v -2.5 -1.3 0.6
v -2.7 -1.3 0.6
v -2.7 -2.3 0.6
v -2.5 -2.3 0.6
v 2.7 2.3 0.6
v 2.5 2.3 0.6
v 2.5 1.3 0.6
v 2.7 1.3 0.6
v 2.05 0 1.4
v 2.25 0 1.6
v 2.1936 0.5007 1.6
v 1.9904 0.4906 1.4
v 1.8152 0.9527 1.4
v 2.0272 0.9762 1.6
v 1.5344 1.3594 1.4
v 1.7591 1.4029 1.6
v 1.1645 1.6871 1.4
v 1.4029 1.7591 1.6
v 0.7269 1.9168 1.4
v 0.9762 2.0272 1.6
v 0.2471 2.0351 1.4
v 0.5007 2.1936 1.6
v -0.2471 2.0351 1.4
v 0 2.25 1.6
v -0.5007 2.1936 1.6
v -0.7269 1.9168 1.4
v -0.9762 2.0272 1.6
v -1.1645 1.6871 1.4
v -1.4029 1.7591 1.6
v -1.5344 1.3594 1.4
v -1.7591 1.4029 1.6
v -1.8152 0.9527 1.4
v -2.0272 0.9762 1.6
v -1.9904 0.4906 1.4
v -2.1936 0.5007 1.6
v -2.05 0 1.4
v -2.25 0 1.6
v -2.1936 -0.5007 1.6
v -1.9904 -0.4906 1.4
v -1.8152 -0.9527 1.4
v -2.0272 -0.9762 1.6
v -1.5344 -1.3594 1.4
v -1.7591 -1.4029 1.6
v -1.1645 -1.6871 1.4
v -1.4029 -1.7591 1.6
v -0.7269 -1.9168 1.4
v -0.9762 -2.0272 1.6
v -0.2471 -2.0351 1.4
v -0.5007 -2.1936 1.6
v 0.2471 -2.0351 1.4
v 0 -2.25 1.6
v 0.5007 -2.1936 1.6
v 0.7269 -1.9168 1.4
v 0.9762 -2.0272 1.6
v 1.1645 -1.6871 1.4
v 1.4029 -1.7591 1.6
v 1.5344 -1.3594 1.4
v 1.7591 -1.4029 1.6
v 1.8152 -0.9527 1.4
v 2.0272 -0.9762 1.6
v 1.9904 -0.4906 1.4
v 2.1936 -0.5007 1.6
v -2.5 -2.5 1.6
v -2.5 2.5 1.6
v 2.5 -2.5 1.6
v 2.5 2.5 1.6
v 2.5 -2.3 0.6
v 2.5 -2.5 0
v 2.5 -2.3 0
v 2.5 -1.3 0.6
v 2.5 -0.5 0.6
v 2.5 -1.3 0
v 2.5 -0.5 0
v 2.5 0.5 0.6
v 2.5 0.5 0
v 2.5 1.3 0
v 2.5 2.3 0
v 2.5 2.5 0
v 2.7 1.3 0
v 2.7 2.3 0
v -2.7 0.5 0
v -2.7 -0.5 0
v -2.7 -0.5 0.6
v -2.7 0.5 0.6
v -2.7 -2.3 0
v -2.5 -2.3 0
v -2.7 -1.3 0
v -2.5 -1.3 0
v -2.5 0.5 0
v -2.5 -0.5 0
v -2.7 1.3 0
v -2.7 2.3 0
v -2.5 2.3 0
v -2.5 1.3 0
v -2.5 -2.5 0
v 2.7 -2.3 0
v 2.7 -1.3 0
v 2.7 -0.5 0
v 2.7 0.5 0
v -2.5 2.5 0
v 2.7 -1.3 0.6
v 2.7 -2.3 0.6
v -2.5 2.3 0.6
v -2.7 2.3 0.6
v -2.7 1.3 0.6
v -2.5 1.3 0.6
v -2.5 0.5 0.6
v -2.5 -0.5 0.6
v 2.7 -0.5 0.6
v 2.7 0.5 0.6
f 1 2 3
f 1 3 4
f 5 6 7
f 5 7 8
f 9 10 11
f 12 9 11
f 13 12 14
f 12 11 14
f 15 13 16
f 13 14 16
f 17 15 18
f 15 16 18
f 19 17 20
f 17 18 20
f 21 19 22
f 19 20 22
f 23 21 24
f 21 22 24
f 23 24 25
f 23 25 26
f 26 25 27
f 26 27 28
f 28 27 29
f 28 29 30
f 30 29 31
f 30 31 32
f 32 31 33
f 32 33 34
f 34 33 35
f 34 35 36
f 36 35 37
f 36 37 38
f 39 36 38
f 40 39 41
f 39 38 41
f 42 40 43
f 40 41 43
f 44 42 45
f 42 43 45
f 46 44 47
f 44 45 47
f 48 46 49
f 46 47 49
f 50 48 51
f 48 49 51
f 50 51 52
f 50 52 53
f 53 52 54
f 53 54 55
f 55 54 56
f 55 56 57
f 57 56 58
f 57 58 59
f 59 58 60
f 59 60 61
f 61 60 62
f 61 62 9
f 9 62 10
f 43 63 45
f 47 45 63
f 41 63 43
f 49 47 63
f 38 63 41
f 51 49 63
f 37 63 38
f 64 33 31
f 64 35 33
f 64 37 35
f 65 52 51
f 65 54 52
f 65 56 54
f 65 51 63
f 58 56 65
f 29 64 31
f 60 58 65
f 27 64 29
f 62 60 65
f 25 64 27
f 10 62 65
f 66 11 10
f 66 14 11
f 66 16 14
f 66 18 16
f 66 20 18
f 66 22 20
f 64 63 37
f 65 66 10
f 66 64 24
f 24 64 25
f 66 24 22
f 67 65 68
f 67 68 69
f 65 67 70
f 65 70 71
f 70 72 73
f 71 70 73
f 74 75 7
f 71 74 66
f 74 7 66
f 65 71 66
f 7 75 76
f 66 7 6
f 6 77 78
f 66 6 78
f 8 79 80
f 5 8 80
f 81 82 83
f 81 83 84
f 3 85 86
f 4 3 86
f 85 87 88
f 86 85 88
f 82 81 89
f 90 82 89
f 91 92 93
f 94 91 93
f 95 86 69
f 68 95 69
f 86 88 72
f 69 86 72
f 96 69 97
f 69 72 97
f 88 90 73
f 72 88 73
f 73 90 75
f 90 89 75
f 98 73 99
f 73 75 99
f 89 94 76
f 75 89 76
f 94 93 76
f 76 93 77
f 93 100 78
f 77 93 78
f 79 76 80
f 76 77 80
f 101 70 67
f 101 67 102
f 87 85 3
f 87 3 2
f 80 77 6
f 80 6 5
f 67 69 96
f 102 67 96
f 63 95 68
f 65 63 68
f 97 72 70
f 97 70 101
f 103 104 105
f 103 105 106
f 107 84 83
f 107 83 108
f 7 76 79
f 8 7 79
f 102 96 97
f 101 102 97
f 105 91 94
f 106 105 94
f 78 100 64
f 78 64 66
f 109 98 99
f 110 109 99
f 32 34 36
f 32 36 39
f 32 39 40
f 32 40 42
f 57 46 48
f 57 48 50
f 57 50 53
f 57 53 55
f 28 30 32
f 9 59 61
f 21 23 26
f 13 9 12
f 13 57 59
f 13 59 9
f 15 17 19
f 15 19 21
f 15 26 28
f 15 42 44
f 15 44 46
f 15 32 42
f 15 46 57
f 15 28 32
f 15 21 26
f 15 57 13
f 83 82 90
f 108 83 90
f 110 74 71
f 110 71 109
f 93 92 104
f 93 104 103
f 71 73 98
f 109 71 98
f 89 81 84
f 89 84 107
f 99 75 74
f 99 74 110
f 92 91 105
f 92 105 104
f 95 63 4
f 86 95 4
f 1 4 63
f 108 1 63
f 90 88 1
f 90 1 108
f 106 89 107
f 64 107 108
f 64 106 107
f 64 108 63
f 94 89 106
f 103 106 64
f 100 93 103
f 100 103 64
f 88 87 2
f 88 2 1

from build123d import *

# Parameters (mm, degrees)
SKETCH1_W           = 5
SKETCH1_H           = 5
BOSS_EXTRUDE1_DEPTH = 1.6
SKETCH2_R           = 2.25
CUT_EXTRUDE1_DEPTH  = 0.2
CUT_EXTRUDE1_DRAFT  = -45
SKETCH3_W           = 0.2
SKETCH3_H           = 1
BOSS_EXTRUDE2_DEPTH = 0.6


with BuildPart() as part:
    # Sketch1 → Boss-Extrude1 (new body)
    with BuildSketch(Plane.XY):
        Rectangle(SKETCH1_W, SKETCH1_H)
    extrude(amount=BOSS_EXTRUDE1_DEPTH)


with BuildPart() as cut_extrude1_tool:
    # Sketch2 → Cut-Extrude1 (with draft: the straight prism first)
    with BuildSketch(Plane.XY.offset(1.6)):
        Circle(SKETCH2_R)
    extrude(amount=-CUT_EXTRUDE1_DEPTH)
    # Cut-Extrude1: the draft: its side faces are tilted about the plane it starts from
    cut_extrude1_sides = [cut_extrude1_tool.faces().sort_by_distance(p)[0] for p in [
        (-2.25, 0, 1.5),
    ]]
    draft(cut_extrude1_sides, Plane.XY.offset(1.6), CUT_EXTRUDE1_DRAFT)


with BuildPart() as part_1:
    add(part.part)

    # Cut-Extrude1: cut by cut_extrude1_tool
    add(cut_extrude1_tool.part, mode=Mode.SUBTRACT)

    # Sketch3 → Boss-Extrude2 (add)
    with BuildSketch(Plane.XY):
        with Locations((-2.6, 1.8)):
            Rectangle(SKETCH3_W, SKETCH3_H)
        with Locations((2.6, 1.8)):
            Rectangle(SKETCH3_W, SKETCH3_H)
        with Locations((2.6, -1.8)):
            Rectangle(SKETCH3_W, SKETCH3_H)
        with Locations((-2.6, -1.8)):
            Rectangle(SKETCH3_W, SKETCH3_H)
        with Locations((2.6, 0)):
            Rectangle(SKETCH3_W, SKETCH3_H)
        with Locations((-2.6, 0)):
            Rectangle(SKETCH3_W, SKETCH3_H)
    extrude(amount=BOSS_EXTRUDE2_DEPTH)


solid = part_1.part
